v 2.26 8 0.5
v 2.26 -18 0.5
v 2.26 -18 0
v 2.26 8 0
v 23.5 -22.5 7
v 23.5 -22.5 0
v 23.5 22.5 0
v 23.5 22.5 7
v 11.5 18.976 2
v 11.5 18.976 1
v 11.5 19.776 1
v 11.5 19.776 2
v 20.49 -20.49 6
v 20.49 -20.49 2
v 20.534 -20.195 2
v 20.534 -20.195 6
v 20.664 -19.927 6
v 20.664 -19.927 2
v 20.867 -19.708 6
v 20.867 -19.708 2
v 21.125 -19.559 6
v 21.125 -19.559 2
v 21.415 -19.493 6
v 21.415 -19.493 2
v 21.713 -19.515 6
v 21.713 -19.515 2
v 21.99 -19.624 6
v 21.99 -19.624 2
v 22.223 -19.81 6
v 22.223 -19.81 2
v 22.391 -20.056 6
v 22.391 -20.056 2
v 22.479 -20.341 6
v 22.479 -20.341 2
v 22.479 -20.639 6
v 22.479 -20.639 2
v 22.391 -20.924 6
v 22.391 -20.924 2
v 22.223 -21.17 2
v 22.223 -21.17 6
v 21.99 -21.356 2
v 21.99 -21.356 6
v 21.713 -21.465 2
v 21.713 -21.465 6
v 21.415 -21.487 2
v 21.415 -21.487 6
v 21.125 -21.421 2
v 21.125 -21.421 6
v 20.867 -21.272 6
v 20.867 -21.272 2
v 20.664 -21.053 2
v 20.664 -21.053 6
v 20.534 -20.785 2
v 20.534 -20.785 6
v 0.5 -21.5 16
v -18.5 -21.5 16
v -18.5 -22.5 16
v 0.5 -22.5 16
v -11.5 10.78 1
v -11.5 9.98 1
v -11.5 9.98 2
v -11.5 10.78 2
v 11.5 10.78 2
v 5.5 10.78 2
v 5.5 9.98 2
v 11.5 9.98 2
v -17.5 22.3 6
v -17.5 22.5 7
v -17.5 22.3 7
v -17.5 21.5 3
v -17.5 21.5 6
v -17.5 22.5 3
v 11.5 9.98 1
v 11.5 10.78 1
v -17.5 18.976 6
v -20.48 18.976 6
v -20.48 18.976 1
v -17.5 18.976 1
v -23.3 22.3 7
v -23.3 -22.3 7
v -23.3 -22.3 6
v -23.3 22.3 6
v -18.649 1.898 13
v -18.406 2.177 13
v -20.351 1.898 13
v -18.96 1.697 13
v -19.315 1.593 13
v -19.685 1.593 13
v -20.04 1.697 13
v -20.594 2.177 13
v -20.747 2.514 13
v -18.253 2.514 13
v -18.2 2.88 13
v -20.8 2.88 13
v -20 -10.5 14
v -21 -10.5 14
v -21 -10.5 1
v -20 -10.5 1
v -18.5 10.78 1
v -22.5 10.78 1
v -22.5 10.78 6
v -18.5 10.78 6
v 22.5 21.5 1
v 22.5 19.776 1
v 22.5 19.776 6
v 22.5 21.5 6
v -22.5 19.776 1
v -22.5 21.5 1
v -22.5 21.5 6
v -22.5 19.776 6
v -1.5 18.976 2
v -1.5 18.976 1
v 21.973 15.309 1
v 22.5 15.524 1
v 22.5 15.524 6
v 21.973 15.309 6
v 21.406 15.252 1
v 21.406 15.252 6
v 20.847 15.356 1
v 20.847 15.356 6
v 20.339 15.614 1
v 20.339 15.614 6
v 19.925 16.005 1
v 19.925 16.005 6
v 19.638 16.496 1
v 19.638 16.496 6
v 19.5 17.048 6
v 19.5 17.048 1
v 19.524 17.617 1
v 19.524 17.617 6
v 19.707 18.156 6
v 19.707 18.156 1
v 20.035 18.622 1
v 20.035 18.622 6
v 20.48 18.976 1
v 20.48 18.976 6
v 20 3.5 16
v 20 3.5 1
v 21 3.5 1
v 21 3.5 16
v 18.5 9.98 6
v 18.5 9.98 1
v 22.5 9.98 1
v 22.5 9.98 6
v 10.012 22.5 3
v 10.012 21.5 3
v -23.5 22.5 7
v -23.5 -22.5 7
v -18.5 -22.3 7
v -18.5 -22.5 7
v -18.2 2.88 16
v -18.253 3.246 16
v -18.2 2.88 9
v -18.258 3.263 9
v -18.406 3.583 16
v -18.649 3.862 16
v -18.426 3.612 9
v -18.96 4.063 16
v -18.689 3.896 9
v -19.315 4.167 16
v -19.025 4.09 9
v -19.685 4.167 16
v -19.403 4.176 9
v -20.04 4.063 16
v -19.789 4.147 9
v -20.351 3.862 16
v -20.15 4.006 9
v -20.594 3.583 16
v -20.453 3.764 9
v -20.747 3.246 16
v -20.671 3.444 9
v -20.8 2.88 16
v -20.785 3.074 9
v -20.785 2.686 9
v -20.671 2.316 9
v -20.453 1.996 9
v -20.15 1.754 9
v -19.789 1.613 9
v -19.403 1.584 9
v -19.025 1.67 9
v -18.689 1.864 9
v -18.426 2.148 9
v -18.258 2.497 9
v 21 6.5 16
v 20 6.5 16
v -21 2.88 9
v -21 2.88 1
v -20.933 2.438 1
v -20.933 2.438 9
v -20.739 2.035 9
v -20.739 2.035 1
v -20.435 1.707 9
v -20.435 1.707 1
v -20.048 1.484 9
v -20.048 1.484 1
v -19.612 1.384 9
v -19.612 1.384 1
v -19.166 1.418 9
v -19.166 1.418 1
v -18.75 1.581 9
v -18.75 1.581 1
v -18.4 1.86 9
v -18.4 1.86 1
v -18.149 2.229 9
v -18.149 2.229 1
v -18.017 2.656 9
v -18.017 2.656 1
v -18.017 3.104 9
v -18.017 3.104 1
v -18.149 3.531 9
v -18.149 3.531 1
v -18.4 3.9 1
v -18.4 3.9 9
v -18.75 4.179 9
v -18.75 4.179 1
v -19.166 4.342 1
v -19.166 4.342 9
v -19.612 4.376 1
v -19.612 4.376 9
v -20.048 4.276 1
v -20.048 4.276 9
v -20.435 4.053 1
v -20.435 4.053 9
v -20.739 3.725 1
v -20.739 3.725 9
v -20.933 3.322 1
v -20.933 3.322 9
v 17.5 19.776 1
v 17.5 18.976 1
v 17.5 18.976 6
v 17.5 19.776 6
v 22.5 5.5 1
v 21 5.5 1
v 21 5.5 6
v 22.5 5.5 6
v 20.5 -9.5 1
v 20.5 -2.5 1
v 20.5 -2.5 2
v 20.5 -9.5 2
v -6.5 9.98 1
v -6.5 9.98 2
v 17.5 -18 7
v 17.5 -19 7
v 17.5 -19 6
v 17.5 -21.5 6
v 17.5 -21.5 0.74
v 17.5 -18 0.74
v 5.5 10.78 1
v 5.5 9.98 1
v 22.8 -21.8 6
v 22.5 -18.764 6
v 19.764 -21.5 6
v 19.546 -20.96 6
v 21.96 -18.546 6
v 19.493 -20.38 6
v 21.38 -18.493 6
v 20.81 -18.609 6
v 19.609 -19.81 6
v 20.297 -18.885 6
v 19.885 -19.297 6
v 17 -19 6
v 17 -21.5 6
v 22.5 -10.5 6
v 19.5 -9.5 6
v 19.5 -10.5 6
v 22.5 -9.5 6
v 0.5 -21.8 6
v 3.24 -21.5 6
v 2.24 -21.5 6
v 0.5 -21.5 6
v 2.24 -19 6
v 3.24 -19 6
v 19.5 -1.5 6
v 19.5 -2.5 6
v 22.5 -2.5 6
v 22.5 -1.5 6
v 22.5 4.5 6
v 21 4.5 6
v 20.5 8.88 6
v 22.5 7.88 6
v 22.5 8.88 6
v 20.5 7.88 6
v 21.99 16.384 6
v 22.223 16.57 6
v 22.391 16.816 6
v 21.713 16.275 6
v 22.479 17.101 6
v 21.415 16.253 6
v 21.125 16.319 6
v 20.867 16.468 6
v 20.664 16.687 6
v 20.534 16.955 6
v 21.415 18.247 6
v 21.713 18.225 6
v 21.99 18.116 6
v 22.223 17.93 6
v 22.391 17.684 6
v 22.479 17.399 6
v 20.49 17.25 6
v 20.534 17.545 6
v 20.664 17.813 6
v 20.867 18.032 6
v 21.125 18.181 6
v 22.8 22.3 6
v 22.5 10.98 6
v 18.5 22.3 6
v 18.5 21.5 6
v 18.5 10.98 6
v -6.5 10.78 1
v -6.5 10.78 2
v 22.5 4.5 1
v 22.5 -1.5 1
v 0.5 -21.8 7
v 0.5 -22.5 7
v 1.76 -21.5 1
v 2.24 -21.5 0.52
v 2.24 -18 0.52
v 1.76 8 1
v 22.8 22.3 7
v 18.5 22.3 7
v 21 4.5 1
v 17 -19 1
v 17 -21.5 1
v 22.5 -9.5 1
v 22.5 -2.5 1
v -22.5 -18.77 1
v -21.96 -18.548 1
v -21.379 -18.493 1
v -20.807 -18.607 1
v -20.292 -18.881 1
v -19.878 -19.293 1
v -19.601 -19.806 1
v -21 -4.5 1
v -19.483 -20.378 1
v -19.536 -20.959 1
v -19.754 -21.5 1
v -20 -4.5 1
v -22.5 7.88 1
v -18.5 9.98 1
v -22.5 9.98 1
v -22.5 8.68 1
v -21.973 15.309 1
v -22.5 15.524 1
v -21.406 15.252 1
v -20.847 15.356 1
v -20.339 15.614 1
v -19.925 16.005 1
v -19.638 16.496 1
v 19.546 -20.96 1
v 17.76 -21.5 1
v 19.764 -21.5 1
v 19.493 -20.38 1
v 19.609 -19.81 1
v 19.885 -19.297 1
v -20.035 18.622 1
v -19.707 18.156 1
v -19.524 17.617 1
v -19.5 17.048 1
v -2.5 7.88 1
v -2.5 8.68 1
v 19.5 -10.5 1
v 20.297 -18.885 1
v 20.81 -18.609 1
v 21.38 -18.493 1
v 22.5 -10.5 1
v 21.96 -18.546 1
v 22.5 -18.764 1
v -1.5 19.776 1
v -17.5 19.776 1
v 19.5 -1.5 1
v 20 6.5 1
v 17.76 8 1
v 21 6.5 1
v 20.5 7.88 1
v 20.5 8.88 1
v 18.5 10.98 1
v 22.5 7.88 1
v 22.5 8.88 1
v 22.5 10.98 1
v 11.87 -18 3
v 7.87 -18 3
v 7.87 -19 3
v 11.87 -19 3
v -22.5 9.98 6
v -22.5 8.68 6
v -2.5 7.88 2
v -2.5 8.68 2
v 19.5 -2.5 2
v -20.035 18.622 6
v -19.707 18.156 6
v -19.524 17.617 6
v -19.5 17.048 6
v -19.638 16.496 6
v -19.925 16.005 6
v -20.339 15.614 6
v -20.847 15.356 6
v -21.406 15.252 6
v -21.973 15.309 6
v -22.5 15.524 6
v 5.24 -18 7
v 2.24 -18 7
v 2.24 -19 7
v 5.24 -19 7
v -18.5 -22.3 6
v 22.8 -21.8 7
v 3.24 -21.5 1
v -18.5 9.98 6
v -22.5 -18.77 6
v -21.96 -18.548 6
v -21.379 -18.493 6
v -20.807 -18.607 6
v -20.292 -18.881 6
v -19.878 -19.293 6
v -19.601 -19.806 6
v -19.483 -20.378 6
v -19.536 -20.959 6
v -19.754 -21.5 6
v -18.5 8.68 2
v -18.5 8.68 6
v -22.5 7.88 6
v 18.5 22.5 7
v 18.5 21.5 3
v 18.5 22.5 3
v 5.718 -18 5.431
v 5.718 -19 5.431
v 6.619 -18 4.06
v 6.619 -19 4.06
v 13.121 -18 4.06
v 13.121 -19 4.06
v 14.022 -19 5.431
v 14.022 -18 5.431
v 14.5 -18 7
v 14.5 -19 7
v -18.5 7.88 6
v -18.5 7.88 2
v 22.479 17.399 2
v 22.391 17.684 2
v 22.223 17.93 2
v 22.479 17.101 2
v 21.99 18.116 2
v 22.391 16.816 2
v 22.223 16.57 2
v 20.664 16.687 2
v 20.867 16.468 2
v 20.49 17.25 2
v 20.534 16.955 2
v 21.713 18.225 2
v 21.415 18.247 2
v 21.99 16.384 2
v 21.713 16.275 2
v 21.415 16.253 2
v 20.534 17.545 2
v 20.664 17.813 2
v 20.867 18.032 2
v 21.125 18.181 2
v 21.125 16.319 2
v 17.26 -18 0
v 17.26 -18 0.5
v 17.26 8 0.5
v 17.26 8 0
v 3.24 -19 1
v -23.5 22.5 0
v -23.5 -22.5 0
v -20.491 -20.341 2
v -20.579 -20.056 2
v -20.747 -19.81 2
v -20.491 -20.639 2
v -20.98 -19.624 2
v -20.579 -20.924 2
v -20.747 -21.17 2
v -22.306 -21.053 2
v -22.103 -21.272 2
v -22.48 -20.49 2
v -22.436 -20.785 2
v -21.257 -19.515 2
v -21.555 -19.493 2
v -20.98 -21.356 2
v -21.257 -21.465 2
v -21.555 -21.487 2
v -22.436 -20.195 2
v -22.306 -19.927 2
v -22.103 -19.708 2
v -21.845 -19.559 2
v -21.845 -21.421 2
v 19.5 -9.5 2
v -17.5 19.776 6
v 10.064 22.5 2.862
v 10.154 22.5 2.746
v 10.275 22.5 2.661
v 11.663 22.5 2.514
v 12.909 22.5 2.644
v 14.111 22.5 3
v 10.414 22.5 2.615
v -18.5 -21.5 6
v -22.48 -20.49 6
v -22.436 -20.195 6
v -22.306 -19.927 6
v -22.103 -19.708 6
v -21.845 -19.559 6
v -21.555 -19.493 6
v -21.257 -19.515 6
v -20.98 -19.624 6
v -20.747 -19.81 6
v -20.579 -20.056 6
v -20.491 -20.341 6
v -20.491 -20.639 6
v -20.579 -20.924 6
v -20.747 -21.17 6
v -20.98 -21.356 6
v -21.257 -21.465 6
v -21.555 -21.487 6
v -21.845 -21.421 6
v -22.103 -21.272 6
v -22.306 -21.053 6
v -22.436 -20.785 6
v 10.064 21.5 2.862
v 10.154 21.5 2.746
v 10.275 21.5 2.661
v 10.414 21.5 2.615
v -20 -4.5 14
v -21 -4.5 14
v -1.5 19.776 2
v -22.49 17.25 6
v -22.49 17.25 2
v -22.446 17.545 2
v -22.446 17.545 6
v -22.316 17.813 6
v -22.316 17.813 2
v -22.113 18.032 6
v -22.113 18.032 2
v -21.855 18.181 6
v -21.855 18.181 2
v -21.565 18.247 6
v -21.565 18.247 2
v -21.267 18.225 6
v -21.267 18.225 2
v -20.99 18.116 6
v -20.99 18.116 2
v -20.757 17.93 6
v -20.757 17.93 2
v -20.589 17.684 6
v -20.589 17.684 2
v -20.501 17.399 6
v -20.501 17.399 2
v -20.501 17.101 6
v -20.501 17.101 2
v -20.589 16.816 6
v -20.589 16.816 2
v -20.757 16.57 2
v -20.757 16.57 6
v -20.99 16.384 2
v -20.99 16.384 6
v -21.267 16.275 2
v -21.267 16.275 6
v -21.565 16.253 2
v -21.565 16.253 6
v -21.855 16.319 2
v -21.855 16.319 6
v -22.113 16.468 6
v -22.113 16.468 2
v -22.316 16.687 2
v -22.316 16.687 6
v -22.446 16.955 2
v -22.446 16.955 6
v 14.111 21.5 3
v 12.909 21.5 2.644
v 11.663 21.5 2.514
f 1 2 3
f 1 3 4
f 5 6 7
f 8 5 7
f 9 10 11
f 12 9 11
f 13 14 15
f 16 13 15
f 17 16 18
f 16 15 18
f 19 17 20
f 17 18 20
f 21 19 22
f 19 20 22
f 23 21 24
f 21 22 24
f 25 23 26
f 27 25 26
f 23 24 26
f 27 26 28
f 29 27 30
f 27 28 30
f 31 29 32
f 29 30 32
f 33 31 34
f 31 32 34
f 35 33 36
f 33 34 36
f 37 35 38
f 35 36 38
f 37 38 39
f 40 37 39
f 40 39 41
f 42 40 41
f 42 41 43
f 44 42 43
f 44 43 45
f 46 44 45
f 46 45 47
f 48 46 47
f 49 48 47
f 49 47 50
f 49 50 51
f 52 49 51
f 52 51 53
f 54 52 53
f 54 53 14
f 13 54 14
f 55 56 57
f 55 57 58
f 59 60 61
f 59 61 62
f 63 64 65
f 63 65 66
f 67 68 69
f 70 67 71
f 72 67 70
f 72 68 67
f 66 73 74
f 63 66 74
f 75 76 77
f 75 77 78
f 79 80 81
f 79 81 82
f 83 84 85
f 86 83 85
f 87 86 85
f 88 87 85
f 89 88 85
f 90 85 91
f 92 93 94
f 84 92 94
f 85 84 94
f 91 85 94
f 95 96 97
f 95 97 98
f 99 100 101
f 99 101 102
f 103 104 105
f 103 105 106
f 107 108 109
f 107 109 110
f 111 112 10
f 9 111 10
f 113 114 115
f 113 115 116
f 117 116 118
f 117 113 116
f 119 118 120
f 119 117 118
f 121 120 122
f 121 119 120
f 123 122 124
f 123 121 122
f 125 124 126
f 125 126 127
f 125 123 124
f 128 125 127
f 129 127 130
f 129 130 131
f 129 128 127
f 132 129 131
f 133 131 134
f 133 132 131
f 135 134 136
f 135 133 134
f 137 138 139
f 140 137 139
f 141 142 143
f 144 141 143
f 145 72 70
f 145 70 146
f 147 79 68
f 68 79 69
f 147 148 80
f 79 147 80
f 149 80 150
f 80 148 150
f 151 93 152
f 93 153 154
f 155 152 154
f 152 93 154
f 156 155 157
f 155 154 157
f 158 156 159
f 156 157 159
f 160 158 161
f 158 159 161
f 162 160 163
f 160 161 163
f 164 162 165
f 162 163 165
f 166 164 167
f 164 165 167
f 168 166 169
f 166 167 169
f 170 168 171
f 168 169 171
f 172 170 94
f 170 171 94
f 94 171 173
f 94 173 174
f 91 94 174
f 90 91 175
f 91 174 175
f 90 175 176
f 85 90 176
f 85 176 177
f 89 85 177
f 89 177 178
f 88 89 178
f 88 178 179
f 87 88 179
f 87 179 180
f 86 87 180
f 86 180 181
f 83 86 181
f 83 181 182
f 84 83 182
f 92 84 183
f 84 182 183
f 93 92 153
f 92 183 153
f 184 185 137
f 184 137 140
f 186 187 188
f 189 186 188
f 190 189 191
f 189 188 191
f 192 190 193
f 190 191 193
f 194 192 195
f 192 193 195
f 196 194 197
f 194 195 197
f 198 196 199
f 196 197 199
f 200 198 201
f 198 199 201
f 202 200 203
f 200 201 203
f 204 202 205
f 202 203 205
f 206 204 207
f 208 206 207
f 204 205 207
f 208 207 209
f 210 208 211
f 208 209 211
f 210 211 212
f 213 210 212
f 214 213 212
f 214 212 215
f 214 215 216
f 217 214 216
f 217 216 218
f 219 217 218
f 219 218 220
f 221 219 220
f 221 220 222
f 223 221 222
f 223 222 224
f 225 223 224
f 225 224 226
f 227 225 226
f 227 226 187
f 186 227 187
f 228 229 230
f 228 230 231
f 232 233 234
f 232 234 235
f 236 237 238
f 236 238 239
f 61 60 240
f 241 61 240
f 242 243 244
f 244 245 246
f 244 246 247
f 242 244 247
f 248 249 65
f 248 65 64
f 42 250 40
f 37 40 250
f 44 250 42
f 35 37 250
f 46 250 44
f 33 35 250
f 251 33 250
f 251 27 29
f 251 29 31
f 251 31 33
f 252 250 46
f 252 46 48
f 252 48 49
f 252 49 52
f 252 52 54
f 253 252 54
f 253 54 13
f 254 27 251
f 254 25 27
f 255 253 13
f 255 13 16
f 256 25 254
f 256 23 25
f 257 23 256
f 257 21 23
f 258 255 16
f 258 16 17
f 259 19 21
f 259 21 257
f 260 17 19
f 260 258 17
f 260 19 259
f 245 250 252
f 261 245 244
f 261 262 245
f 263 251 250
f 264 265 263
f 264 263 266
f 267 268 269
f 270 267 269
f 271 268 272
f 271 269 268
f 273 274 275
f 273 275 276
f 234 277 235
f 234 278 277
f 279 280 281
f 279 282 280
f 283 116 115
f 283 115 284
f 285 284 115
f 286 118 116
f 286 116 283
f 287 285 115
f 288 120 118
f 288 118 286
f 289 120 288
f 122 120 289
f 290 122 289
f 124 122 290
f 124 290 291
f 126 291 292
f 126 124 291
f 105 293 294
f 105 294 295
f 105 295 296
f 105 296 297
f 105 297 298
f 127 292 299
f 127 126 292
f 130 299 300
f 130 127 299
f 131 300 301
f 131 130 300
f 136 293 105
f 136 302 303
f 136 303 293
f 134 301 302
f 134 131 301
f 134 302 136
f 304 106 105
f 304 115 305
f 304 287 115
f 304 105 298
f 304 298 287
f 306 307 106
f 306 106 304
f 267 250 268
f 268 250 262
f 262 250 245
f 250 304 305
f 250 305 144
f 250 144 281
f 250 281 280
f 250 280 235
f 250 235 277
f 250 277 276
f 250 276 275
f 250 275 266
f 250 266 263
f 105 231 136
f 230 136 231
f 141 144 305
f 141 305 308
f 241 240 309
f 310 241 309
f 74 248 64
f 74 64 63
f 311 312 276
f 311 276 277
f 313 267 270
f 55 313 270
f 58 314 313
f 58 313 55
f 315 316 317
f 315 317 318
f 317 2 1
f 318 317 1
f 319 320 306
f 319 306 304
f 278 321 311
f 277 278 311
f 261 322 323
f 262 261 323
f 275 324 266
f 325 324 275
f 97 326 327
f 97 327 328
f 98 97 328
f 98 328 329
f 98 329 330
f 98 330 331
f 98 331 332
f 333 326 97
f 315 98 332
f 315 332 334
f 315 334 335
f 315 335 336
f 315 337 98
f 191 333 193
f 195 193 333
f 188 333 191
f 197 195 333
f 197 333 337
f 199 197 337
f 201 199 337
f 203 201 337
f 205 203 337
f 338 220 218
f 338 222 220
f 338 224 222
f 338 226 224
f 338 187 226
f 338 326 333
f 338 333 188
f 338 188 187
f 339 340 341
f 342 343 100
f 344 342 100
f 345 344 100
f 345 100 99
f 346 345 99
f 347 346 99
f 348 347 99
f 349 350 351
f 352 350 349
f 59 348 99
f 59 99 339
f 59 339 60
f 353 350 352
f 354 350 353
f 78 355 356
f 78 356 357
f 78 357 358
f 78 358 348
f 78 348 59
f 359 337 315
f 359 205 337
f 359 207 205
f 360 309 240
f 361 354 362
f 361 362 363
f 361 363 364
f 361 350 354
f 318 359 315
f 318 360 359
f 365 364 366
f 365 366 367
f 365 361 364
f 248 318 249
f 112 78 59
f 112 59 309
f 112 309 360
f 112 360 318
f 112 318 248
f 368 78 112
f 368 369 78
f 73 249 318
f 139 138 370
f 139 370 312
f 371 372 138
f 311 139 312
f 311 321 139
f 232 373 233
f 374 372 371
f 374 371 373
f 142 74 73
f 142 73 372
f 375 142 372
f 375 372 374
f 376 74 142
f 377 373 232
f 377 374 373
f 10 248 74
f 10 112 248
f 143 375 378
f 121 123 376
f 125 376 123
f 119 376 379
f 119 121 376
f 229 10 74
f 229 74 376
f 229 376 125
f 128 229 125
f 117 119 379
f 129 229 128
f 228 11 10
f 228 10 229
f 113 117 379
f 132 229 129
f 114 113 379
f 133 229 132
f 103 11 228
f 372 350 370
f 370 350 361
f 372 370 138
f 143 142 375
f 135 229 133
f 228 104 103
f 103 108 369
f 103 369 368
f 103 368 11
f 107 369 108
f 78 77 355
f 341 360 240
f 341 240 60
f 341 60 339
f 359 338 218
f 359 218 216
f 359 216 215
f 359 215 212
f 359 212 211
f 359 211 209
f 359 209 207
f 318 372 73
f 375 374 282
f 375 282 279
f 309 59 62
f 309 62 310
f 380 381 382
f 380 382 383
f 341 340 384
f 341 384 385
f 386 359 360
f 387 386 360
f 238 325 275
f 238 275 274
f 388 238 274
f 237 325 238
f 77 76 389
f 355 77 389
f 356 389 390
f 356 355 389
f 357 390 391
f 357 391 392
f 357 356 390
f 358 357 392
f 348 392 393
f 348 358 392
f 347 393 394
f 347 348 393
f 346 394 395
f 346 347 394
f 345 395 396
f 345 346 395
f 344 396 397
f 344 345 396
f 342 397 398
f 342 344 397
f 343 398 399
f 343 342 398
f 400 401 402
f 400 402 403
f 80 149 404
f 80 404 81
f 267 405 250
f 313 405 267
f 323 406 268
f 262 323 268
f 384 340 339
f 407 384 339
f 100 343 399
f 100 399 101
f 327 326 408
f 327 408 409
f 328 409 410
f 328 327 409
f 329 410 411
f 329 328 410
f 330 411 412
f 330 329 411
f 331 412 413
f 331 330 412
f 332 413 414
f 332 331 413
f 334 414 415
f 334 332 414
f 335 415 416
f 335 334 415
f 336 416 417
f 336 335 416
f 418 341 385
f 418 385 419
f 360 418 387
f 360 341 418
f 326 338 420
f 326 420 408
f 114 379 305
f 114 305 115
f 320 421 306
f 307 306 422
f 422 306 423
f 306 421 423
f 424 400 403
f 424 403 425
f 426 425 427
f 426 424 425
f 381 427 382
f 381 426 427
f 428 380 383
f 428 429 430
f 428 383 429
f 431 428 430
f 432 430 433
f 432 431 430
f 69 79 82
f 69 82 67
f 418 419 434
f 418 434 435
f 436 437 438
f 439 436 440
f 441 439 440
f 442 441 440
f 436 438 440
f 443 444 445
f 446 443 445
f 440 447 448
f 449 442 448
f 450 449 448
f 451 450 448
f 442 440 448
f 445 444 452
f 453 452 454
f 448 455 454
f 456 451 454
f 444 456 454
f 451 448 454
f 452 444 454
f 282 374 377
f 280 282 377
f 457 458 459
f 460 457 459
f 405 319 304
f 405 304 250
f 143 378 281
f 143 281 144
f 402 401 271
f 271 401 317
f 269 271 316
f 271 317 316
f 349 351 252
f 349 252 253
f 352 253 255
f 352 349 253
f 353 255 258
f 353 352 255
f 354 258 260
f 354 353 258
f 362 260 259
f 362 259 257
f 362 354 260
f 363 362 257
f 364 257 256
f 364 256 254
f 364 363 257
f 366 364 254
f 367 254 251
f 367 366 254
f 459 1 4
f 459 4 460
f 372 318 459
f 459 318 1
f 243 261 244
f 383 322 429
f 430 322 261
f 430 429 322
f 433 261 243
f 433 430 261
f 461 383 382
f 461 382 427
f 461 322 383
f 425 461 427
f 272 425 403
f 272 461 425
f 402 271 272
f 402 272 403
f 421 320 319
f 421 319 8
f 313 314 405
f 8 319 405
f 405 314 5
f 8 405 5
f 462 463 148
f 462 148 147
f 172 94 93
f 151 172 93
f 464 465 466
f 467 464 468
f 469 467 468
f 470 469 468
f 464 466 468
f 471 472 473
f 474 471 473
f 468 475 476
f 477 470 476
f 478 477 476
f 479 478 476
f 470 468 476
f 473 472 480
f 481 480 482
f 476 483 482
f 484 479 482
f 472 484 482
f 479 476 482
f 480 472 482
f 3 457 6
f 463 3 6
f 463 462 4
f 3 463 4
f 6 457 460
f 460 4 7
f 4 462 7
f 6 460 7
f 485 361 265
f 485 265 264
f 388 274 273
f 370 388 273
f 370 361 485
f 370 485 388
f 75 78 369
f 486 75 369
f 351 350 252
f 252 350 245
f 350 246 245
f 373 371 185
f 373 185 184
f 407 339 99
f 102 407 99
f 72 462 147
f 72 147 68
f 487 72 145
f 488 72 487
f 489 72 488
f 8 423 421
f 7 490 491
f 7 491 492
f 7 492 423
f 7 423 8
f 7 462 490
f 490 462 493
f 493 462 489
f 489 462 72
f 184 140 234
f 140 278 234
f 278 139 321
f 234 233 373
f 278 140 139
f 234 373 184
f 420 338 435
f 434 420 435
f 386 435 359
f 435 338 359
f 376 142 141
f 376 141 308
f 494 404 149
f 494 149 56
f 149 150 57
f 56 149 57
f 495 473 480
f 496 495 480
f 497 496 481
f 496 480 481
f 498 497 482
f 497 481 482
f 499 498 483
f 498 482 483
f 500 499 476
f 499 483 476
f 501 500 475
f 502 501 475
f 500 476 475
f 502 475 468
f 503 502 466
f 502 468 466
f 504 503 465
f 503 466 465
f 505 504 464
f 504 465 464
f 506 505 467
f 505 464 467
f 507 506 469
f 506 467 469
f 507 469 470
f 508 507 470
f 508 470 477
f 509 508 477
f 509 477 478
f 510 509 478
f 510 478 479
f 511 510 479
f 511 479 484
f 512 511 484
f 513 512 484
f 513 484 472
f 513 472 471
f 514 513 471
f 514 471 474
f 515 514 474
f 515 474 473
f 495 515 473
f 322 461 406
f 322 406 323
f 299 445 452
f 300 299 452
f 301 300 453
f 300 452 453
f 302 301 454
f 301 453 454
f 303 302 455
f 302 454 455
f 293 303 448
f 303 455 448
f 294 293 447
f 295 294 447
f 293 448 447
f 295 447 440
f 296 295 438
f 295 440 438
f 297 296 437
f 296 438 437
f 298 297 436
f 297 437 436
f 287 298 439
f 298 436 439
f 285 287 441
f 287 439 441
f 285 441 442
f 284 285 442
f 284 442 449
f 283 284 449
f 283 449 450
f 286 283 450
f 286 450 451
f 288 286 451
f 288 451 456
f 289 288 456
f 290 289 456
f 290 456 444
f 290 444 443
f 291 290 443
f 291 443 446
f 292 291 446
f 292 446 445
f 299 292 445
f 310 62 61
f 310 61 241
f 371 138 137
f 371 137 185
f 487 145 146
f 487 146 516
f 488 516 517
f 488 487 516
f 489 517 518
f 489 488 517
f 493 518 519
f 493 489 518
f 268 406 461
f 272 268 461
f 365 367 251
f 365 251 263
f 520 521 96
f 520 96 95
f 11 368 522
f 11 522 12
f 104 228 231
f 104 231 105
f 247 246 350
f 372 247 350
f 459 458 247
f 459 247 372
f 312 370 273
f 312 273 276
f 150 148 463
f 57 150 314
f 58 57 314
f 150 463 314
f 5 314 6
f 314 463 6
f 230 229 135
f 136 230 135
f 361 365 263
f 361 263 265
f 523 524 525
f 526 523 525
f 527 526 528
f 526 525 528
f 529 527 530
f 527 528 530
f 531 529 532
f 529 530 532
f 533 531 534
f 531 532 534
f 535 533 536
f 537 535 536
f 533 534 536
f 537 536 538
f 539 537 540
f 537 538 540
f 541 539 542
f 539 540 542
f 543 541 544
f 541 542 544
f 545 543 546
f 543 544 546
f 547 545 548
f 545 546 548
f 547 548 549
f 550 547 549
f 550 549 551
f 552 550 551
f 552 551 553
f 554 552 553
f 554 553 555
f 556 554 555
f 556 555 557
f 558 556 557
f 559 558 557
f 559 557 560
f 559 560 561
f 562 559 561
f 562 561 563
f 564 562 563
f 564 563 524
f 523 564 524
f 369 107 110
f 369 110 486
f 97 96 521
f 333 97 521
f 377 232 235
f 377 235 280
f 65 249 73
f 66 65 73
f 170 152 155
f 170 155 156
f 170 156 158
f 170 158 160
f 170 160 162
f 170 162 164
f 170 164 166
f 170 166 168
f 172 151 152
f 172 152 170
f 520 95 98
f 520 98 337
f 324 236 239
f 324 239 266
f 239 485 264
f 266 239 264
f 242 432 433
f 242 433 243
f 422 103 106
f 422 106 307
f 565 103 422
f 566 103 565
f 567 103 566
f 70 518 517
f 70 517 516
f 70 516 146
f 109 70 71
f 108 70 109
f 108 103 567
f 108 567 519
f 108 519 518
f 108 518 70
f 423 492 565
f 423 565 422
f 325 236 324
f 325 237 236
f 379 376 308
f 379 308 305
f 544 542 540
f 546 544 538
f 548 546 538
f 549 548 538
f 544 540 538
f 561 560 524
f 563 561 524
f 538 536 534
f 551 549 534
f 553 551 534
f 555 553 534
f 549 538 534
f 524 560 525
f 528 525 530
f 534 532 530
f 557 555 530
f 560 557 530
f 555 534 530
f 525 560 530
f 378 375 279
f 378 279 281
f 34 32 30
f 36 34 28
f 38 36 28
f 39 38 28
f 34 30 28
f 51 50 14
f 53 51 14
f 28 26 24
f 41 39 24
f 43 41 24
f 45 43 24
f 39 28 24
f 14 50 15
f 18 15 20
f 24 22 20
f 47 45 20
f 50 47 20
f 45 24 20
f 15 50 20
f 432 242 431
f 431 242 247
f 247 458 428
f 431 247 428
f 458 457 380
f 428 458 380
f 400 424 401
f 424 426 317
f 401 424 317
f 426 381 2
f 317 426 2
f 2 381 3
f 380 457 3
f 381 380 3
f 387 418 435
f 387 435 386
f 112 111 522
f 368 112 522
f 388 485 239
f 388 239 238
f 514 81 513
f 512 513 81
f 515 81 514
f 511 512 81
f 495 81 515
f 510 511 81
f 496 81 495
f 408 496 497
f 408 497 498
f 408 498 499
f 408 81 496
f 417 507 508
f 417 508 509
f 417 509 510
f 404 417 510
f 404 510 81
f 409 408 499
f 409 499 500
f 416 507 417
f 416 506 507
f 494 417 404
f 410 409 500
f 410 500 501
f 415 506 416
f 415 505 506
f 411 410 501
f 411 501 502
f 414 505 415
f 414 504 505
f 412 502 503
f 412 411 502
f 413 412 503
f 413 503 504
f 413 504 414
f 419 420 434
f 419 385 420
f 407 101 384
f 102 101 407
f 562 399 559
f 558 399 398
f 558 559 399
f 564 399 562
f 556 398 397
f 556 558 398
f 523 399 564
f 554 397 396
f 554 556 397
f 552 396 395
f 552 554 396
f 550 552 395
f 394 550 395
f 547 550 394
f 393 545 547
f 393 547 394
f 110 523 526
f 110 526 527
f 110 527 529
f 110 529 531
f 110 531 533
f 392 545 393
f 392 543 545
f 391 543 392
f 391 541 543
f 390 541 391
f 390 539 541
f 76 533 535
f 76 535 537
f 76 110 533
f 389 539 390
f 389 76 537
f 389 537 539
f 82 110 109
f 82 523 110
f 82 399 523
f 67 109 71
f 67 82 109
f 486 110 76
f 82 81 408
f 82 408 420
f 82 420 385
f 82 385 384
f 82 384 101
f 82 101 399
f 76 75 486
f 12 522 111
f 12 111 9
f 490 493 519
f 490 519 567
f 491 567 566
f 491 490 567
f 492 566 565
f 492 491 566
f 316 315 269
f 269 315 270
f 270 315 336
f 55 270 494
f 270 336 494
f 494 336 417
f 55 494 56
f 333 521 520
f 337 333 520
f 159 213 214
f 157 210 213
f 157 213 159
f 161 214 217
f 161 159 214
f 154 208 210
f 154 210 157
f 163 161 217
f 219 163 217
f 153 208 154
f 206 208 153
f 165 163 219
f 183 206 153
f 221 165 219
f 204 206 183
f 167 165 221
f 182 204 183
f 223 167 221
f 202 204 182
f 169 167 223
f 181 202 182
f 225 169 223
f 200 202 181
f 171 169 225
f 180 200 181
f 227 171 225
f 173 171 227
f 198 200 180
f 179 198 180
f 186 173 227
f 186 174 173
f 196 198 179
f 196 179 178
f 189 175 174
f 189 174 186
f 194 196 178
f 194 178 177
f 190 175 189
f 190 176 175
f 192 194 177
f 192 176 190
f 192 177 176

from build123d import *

# Parameters (mm, degrees)
SCHIZZO1_W                           = 47
SCHIZZO1_H                           = 45
ESTRUSIONE_ESTRUSIONE1_DEPTH         = 16
SCHIZZO3_W                           = 5
SCHIZZO3_H                           = 9
SCHIZZO3_W_2                         = 23
TAGLIO_ESTRUSIONE1_DEPTH             = 54.228281956
TAGLIO_ESTRUSIONE2_REACH             = 52.262
SCHIZZO4_W                           = 9
SCHIZZO4_H                           = 44
TAGLIO_ESTRUSIONE3_DEPTH             = 1
FORO_PER_VITE_M3_1_D                 = 2
FORO_PER_VITE_M3_1_DEPTH             = 4
SVUOTA1_START                        = 1
SVUOTA1_DEPTH                        = 5
SCHIZZO11_W                          = 15
SCHIZZO11_H                          = 26
TAGLIO_ESTRUSIONE4_DEPTH             = 36.825968235
TAGLIO_ESTRUSIONE5_REACH             = 55.228
SCHIZZO12_W                          = 36
SCHIZZO12_H                          = 4
TAGLIO_ESTRUSIONE5_DIRECTION_2_DEPTH = 54.228281956
ESTRUSIONE_ESTRUSIONE2_DEPTH         = 6
SCHIZZO14_W                          = 1
SCHIZZO14_H                          = 2.5
TAGLIO_ESTRUSIONE6_DEPTH             = 15.26
TAGLIO_ESTRUSIONE7_REACH             = 51.482
SMUSSO1_SIZE                         = 0.5
SCHIZZO16_W                          = 4
SCHIZZO16_H                          = 1
SCHIZZO16_W_2                        = 2
SCHIZZO16_W_3                        = 20
SCHIZZO16_H_2                        = 0.8
SCHIZZO16_W_4                        = 5
SCHIZZO16_W_5                        = 13
SCHIZZO16_W_6                        = 6
SCHIZZO16_W_7                        = 1.5
ESTRUSIONE_ESTRUSIONE3_DEPTH         = 5
TAGLIO_ESTRUSIONE8_REACH             = 53.1
SCHIZZO17_W                          = 4
SCHIZZO17_H                          = 7
SCHIZZO18_W                          = 29
SCHIZZO18_H                          = 4
TAGLIO_ESTRUSIONE9_DEPTH             = 11.896238686
TAGLIO_ESTRUSIONE10_REACH            = 44.195
SCHIZZO19_W                          = 1
SCHIZZO19_H                          = 4
SCHIZZO20_R                          = 1.5
SCHIZZO20_W                          = 1
SCHIZZO20_H                          = 3
ESTRUSIONE_ESTRUSIONE4_DEPTH         = 15
TAGLIO_ESTRUSIONE11_START            = -7
SCHIZZO21_R                          = 1.5
SCHIZZO21_R_2                        = 1.3
TAGLIO_ESTRUSIONE11_DEPTH            = 7
TAGLIO_ESTRUSIONE12_START            = -3
TAGLIO_ESTRUSIONE12_DEPTH            = 3
SCHIZZO23_W                          = 1
SCHIZZO23_H                          = 6
ESTRUSIONE_ESTRUSIONE5_DEPTH         = 13
TAGLIO_ESTRUSIONE14_REACH            = 55.228


# Read off the part's stored shape, not the designer's step: Svuota1
with BuildPart() as part:
    # Schizzo1 → Estrusione-Estrusione1 (new body)
    with BuildSketch(Plane.XY):
        Rectangle(SCHIZZO1_W, SCHIZZO1_H)
    extrude(amount=ESTRUSIONE_ESTRUSIONE1_DEPTH)

    # Schizzo3 → Taglio-Estrusione1 (cut, through all)
    with BuildSketch(Plane.XZ.offset(22.5)):
        with Locations((-21, 11.5)):
            Rectangle(SCHIZZO3_W, SCHIZZO3_H)
        with Locations((12, 11.5)):
            Rectangle(SCHIZZO3_W_2, SCHIZZO3_H)
    extrude(amount=-TAGLIO_ESTRUSIONE1_DEPTH, mode=Mode.SUBTRACT)

    # Schizzo4 → Taglio-Estrusione2 (cut, up to next)
    with BuildSketch(Plane.ZY.offset(18.5), mode=Mode.PRIVATE) as taglio_estrusione2_sk1:
        with Locations((11.5, 0.5)):
            Rectangle(SCHIZZO4_W, SCHIZZO4_H)
    taglio_estrusione2_tool1 = extrude(taglio_estrusione2_sk1.sketch, amount=-TAGLIO_ESTRUSIONE2_REACH, mode=Mode.PRIVATE) & part.part
    add(taglio_estrusione2_tool1.solids().sort_by_distance((-18.5, 0.5, 11.5))[0], mode=Mode.SUBTRACT)

    # Schizzo5 → Taglio-Estrusione3 (cut)
    with BuildSketch(Plane.XY.offset(7)):
        Polygon((-18.5, -21.5), (-18.5, -22.3), (-23.3, -22.3), (-23.3, 22.3), (22.8, 22.3), (22.8, -21.8), (0.5, -21.8), (0.5, -21.5), align=None)
    extrude(amount=-TAGLIO_ESTRUSIONE3_DEPTH, mode=Mode.SUBTRACT)

    # Foro per Vite M3-1
    with Locations(Plane.XY.offset(6)):
        with Locations((-21.49, 17.25), (-21.48, -20.49), (21.49, -20.49), (21.49, 17.25)):
            Hole(FORO_PER_VITE_M3_1_D / 2, depth=FORO_PER_VITE_M3_1_DEPTH)

    # Svuota1 outline → Svuota1 (cut)
    with BuildSketch(Plane.XY.offset(SVUOTA1_START)):
        with BuildLine():
            ThreePointArc((-22.5, -18.769651198), (-20.069895601, -19.071689179), (-19.753761314, -21.5))
            Line((-19.753761314, -21.5), (19.763761314, -21.5))
            ThreePointArc((19.763761314, -21.5), (20.075786438, -19.075786438), (22.5, -18.763761314))
            Line((22.5, -18.763761314), (22.5, 15.523761314))
            ThreePointArc((22.5, 15.523761314), (19.49, 17.25), (22.5, 18.976238686))
            Line((22.5, 18.976238686), (22.5, 21.5))
            Line((22.5, 21.5), (-22.5, 21.5))
            Line((-22.5, 21.5), (-22.5, 18.976238686))
            ThreePointArc((-22.5, 18.976238686), (-19.49, 17.25), (-22.5, 15.523761314))
            Line((-22.5, 15.523761314), (-22.5, -18.769651198))
        make_face()
    extrude(amount=SVUOTA1_DEPTH, mode=Mode.SUBTRACT)

    # Schizzo11 → Taglio-Estrusione4 (cut, through all)
    with BuildSketch(Plane.XY.offset(1)):
        with Locations((9.76, -5)):
            Rectangle(SCHIZZO11_W, SCHIZZO11_H)
    extrude(amount=-TAGLIO_ESTRUSIONE4_DEPTH, mode=Mode.SUBTRACT)

    # Taglio-Estrusione5: up to this face of the body (flat: up to its plane)
    taglio_estrusione5_end = Plane(part.part.faces().sort_by_distance((0, 21.5, 3.5))[0])
    # Schizzo12 → Taglio-Estrusione5 (cut, up to the picked face)
    with BuildSketch(Plane(origin=(0, 22.5, 0), x_dir=(1, 0, 0), z_dir=(0, 1, 0)), mode=Mode.PRIVATE) as taglio_estrusione5_sk1:
        with Locations((0.5, -5)):
            Rectangle(SCHIZZO12_W, SCHIZZO12_H)
    taglio_estrusione5_tool1 = split(extrude(taglio_estrusione5_sk1.sketch, amount=-TAGLIO_ESTRUSIONE5_REACH, mode=Mode.PRIVATE), bisect_by=taglio_estrusione5_end, keep=Keep.BOTH, mode=Mode.PRIVATE)
    add(taglio_estrusione5_tool1.solids().sort_by(Axis((0.5, 22.5, 5), (0, -1, 0)))[0], mode=Mode.SUBTRACT)

    # Schizzo12 → Taglio-Estrusione5 direction 2 (cut)
    with BuildSketch(Plane(origin=(0, 22.5, 0), x_dir=(1, 0, 0), z_dir=(0, 1, 0))):
        with Locations((0.5, -5)):
            Rectangle(SCHIZZO12_W, SCHIZZO12_H)
    extrude(amount=TAGLIO_ESTRUSIONE5_DIRECTION_2_DEPTH, mode=Mode.SUBTRACT)

    # Schizzo13 → Estrusione-Estrusione2 (add)
    with BuildSketch(Plane.XY.offset(1)):
        Polygon((17.5, -21.5), (17.5, -18), (2.24, -18), (2.24, -21.5), (3.24, -21.5), (3.24, -19), (17, -19), (17, -21.5), align=None)
    extrude(amount=ESTRUSIONE_ESTRUSIONE2_DEPTH)

    # Schizzo14 → Taglio-Estrusione6 (cut)
    with BuildSketch(Plane.ZY.offset(-2.24)):
        with Locations((6.5, -20.25)):
            Rectangle(SCHIZZO14_W, SCHIZZO14_H)
    extrude(amount=-TAGLIO_ESTRUSIONE6_DEPTH, mode=Mode.SUBTRACT)

    # Schizzo15 → Taglio-Estrusione7 (cut, up to next)
    with BuildSketch(Plane(origin=(0, -18, 0), x_dir=(1, 0, 0), z_dir=(0, 1, 0)), mode=Mode.PRIVATE) as taglio_estrusione7_sk1:
        with BuildLine():
            Line((7.87, -3), (11.87, -3))
            ThreePointArc((11.87, -3), (13.620947528, -4.7133645), (14.5, -7))
            Line((14.5, -7), (5.24, -7))
            ThreePointArc((5.24, -7), (6.119052472, -4.7133645), (7.87, -3))
        make_face()
    taglio_estrusione7_tool1 = extrude(taglio_estrusione7_sk1.sketch, amount=-TAGLIO_ESTRUSIONE7_REACH, mode=Mode.PRIVATE) & part.part
    add(taglio_estrusione7_tool1.solids().sort_by_distance((9.87, -18, 5.221754))[0], mode=Mode.SUBTRACT)

    # Smusso1
    smusso1_edges = [part.edges().sort_by_distance(p)[0] for p in [
        (2.26, -5, 1),
        (17.26, -5, 1),
    ]]
    chamfer(smusso1_edges, length=SMUSSO1_SIZE)

    # Schizzo16 → Estrusione-Estrusione3 (add)
    with BuildSketch(Plane.XY.offset(1)):
        Polygon((22.5, -9.5), (22.5, -10.5), (19.5, -10.5), (19.5, -1.5), (22.5, -1.5), (22.5, -2.5), (20.5, -2.5), (20.5, -9.5), align=None)
        with Locations((20.5, 10.48)):
            Rectangle(SCHIZZO16_W, SCHIZZO16_H)
        with Locations((21.5, 8.38)):
            Rectangle(SCHIZZO16_W_2, SCHIZZO16_H)
        with Locations((-12.5, 8.28)):
            Rectangle(SCHIZZO16_W_3, SCHIZZO16_H_2)
        with Locations((-20.5, 10.38)):
            Rectangle(SCHIZZO16_W, SCHIZZO16_H_2)
        with Locations((-20, 19.376238686)):
            Rectangle(SCHIZZO16_W_4, SCHIZZO16_H_2)
        with Locations((20, 19.376238686)):
            Rectangle(SCHIZZO16_W_4, SCHIZZO16_H_2)
        with Locations((5, 19.376238686)):
            Rectangle(SCHIZZO16_W_5, SCHIZZO16_H_2)
        with Locations((8.5, 10.38)):
            Rectangle(SCHIZZO16_W_6, SCHIZZO16_H_2)
        with Locations((-9, 10.38)):
            Rectangle(SCHIZZO16_W_4, SCHIZZO16_H_2)
        with Locations((21.75, 5)):
            Rectangle(SCHIZZO16_W_7, SCHIZZO16_H)
    extrude(amount=ESTRUSIONE_ESTRUSIONE3_DEPTH)

    # Schizzo17 → Taglio-Estrusione8 (cut, up to next)
    with BuildSketch(Plane.ZY.offset(-19.5), mode=Mode.PRIVATE) as taglio_estrusione8_sk1:
        with Locations((4, -6)):
            Rectangle(SCHIZZO17_W, SCHIZZO17_H)
    taglio_estrusione8_tool1 = extrude(taglio_estrusione8_sk1.sketch, amount=-TAGLIO_ESTRUSIONE8_REACH, mode=Mode.PRIVATE) & part.part
    add(taglio_estrusione8_tool1.solids().sort_by_distance((19.5, -6, 4))[0], mode=Mode.SUBTRACT)

    # Schizzo18 → Taglio-Estrusione9 (cut)
    with BuildSketch(Plane(origin=(0, 19.776238686, 0), x_dir=(1, 0, 0), z_dir=(0, 1, 0))):
        with Locations((-3, -4)):
            Rectangle(SCHIZZO18_W, SCHIZZO18_H)
    extrude(amount=-TAGLIO_ESTRUSIONE9_DEPTH, mode=Mode.SUBTRACT)

    # Schizzo19 → Taglio-Estrusione10 (cut, up to next)
    with BuildSketch(Plane(origin=(0, 8.68, 0), x_dir=(1, 0, 0), z_dir=(0, 1, 0)), mode=Mode.PRIVATE) as taglio_estrusione10_sk1:
        with Locations((-18, -4)):
            Rectangle(SCHIZZO19_W, SCHIZZO19_H)
    taglio_estrusione10_tool1 = extrude(taglio_estrusione10_sk1.sketch, amount=-TAGLIO_ESTRUSIONE10_REACH, mode=Mode.PRIVATE) & part.part
    add(taglio_estrusione10_tool1.solids().sort_by_distance((-18, 8.68, 4))[0], mode=Mode.SUBTRACT)

    # Schizzo20 → Estrusione-Estrusione4 (add)
    with BuildSketch(Plane.XY.offset(1)):
        with Locations(Location((-19.5, 2.88, 0), (0, 0, 180))):
            Circle(SCHIZZO20_R)
        with Locations((20.5, 5)):
            Rectangle(SCHIZZO20_W, SCHIZZO20_H)
    extrude(amount=ESTRUSIONE_ESTRUSIONE4_DEPTH)

    # Schizzo21 → Taglio-Estrusione11 (cut)
    with BuildSketch(Plane.XY.offset(16).offset(TAGLIO_ESTRUSIONE11_START)):
        with Locations(Location((-19.5, 2.88, 0), (0, 0, 180))):
            Circle(SCHIZZO21_R)
        with Locations((-19.5, 2.88)):
            Circle(SCHIZZO21_R_2, mode=Mode.SUBTRACT)
    extrude(amount=TAGLIO_ESTRUSIONE11_DEPTH, mode=Mode.SUBTRACT)

    # Schizzo22 → Taglio-Estrusione12 (cut)
    with BuildSketch(Plane.XY.offset(16).offset(TAGLIO_ESTRUSIONE12_START)):
        with BuildLine():
            Line((-20.8, 2.88), (-18.2, 2.88))
            ThreePointArc((-18.2, 2.88), (-19.5, 1.58), (-20.8, 2.88))
        make_face()
    extrude(amount=TAGLIO_ESTRUSIONE12_DEPTH, mode=Mode.SUBTRACT)

    # Schizzo23 → Estrusione-Estrusione5 (add)
    with BuildSketch(Plane.XY.offset(1)):
        with Locations((-20.5, -7.5)):
            Rectangle(SCHIZZO23_W, SCHIZZO23_H)
    extrude(amount=ESTRUSIONE_ESTRUSIONE5_DEPTH)

    # Schizzo25 → Taglio-Estrusione14 (cut, up to next)
    with BuildSketch(Plane(origin=(0, 22.5, 0), x_dir=(1, 0, 0), z_dir=(0, 1, 0)), mode=Mode.PRIVATE) as taglio_estrusione14_sk1:
        with BuildLine():
            Line((14.110810194, -3), (10.011633802, -3))
            ThreePointArc((10.011633802, -3), (10.15430246, -2.745992416), (10.414334326, -2.614624125))
            ThreePointArc((10.414334326, -2.614624125), (12.289339232, -2.550566702), (14.110810194, -3))
        make_face()
    taglio_estrusione14_tool1 = extrude(taglio_estrusione14_sk1.sketch, amount=-TAGLIO_ESTRUSIONE14_REACH, mode=Mode.PRIVATE) & part.part
    add(taglio_estrusione14_tool1.solids().sort_by_distance((11.816989, 22.5, 2.796311))[0], mode=Mode.SUBTRACT)


solid = part.part
